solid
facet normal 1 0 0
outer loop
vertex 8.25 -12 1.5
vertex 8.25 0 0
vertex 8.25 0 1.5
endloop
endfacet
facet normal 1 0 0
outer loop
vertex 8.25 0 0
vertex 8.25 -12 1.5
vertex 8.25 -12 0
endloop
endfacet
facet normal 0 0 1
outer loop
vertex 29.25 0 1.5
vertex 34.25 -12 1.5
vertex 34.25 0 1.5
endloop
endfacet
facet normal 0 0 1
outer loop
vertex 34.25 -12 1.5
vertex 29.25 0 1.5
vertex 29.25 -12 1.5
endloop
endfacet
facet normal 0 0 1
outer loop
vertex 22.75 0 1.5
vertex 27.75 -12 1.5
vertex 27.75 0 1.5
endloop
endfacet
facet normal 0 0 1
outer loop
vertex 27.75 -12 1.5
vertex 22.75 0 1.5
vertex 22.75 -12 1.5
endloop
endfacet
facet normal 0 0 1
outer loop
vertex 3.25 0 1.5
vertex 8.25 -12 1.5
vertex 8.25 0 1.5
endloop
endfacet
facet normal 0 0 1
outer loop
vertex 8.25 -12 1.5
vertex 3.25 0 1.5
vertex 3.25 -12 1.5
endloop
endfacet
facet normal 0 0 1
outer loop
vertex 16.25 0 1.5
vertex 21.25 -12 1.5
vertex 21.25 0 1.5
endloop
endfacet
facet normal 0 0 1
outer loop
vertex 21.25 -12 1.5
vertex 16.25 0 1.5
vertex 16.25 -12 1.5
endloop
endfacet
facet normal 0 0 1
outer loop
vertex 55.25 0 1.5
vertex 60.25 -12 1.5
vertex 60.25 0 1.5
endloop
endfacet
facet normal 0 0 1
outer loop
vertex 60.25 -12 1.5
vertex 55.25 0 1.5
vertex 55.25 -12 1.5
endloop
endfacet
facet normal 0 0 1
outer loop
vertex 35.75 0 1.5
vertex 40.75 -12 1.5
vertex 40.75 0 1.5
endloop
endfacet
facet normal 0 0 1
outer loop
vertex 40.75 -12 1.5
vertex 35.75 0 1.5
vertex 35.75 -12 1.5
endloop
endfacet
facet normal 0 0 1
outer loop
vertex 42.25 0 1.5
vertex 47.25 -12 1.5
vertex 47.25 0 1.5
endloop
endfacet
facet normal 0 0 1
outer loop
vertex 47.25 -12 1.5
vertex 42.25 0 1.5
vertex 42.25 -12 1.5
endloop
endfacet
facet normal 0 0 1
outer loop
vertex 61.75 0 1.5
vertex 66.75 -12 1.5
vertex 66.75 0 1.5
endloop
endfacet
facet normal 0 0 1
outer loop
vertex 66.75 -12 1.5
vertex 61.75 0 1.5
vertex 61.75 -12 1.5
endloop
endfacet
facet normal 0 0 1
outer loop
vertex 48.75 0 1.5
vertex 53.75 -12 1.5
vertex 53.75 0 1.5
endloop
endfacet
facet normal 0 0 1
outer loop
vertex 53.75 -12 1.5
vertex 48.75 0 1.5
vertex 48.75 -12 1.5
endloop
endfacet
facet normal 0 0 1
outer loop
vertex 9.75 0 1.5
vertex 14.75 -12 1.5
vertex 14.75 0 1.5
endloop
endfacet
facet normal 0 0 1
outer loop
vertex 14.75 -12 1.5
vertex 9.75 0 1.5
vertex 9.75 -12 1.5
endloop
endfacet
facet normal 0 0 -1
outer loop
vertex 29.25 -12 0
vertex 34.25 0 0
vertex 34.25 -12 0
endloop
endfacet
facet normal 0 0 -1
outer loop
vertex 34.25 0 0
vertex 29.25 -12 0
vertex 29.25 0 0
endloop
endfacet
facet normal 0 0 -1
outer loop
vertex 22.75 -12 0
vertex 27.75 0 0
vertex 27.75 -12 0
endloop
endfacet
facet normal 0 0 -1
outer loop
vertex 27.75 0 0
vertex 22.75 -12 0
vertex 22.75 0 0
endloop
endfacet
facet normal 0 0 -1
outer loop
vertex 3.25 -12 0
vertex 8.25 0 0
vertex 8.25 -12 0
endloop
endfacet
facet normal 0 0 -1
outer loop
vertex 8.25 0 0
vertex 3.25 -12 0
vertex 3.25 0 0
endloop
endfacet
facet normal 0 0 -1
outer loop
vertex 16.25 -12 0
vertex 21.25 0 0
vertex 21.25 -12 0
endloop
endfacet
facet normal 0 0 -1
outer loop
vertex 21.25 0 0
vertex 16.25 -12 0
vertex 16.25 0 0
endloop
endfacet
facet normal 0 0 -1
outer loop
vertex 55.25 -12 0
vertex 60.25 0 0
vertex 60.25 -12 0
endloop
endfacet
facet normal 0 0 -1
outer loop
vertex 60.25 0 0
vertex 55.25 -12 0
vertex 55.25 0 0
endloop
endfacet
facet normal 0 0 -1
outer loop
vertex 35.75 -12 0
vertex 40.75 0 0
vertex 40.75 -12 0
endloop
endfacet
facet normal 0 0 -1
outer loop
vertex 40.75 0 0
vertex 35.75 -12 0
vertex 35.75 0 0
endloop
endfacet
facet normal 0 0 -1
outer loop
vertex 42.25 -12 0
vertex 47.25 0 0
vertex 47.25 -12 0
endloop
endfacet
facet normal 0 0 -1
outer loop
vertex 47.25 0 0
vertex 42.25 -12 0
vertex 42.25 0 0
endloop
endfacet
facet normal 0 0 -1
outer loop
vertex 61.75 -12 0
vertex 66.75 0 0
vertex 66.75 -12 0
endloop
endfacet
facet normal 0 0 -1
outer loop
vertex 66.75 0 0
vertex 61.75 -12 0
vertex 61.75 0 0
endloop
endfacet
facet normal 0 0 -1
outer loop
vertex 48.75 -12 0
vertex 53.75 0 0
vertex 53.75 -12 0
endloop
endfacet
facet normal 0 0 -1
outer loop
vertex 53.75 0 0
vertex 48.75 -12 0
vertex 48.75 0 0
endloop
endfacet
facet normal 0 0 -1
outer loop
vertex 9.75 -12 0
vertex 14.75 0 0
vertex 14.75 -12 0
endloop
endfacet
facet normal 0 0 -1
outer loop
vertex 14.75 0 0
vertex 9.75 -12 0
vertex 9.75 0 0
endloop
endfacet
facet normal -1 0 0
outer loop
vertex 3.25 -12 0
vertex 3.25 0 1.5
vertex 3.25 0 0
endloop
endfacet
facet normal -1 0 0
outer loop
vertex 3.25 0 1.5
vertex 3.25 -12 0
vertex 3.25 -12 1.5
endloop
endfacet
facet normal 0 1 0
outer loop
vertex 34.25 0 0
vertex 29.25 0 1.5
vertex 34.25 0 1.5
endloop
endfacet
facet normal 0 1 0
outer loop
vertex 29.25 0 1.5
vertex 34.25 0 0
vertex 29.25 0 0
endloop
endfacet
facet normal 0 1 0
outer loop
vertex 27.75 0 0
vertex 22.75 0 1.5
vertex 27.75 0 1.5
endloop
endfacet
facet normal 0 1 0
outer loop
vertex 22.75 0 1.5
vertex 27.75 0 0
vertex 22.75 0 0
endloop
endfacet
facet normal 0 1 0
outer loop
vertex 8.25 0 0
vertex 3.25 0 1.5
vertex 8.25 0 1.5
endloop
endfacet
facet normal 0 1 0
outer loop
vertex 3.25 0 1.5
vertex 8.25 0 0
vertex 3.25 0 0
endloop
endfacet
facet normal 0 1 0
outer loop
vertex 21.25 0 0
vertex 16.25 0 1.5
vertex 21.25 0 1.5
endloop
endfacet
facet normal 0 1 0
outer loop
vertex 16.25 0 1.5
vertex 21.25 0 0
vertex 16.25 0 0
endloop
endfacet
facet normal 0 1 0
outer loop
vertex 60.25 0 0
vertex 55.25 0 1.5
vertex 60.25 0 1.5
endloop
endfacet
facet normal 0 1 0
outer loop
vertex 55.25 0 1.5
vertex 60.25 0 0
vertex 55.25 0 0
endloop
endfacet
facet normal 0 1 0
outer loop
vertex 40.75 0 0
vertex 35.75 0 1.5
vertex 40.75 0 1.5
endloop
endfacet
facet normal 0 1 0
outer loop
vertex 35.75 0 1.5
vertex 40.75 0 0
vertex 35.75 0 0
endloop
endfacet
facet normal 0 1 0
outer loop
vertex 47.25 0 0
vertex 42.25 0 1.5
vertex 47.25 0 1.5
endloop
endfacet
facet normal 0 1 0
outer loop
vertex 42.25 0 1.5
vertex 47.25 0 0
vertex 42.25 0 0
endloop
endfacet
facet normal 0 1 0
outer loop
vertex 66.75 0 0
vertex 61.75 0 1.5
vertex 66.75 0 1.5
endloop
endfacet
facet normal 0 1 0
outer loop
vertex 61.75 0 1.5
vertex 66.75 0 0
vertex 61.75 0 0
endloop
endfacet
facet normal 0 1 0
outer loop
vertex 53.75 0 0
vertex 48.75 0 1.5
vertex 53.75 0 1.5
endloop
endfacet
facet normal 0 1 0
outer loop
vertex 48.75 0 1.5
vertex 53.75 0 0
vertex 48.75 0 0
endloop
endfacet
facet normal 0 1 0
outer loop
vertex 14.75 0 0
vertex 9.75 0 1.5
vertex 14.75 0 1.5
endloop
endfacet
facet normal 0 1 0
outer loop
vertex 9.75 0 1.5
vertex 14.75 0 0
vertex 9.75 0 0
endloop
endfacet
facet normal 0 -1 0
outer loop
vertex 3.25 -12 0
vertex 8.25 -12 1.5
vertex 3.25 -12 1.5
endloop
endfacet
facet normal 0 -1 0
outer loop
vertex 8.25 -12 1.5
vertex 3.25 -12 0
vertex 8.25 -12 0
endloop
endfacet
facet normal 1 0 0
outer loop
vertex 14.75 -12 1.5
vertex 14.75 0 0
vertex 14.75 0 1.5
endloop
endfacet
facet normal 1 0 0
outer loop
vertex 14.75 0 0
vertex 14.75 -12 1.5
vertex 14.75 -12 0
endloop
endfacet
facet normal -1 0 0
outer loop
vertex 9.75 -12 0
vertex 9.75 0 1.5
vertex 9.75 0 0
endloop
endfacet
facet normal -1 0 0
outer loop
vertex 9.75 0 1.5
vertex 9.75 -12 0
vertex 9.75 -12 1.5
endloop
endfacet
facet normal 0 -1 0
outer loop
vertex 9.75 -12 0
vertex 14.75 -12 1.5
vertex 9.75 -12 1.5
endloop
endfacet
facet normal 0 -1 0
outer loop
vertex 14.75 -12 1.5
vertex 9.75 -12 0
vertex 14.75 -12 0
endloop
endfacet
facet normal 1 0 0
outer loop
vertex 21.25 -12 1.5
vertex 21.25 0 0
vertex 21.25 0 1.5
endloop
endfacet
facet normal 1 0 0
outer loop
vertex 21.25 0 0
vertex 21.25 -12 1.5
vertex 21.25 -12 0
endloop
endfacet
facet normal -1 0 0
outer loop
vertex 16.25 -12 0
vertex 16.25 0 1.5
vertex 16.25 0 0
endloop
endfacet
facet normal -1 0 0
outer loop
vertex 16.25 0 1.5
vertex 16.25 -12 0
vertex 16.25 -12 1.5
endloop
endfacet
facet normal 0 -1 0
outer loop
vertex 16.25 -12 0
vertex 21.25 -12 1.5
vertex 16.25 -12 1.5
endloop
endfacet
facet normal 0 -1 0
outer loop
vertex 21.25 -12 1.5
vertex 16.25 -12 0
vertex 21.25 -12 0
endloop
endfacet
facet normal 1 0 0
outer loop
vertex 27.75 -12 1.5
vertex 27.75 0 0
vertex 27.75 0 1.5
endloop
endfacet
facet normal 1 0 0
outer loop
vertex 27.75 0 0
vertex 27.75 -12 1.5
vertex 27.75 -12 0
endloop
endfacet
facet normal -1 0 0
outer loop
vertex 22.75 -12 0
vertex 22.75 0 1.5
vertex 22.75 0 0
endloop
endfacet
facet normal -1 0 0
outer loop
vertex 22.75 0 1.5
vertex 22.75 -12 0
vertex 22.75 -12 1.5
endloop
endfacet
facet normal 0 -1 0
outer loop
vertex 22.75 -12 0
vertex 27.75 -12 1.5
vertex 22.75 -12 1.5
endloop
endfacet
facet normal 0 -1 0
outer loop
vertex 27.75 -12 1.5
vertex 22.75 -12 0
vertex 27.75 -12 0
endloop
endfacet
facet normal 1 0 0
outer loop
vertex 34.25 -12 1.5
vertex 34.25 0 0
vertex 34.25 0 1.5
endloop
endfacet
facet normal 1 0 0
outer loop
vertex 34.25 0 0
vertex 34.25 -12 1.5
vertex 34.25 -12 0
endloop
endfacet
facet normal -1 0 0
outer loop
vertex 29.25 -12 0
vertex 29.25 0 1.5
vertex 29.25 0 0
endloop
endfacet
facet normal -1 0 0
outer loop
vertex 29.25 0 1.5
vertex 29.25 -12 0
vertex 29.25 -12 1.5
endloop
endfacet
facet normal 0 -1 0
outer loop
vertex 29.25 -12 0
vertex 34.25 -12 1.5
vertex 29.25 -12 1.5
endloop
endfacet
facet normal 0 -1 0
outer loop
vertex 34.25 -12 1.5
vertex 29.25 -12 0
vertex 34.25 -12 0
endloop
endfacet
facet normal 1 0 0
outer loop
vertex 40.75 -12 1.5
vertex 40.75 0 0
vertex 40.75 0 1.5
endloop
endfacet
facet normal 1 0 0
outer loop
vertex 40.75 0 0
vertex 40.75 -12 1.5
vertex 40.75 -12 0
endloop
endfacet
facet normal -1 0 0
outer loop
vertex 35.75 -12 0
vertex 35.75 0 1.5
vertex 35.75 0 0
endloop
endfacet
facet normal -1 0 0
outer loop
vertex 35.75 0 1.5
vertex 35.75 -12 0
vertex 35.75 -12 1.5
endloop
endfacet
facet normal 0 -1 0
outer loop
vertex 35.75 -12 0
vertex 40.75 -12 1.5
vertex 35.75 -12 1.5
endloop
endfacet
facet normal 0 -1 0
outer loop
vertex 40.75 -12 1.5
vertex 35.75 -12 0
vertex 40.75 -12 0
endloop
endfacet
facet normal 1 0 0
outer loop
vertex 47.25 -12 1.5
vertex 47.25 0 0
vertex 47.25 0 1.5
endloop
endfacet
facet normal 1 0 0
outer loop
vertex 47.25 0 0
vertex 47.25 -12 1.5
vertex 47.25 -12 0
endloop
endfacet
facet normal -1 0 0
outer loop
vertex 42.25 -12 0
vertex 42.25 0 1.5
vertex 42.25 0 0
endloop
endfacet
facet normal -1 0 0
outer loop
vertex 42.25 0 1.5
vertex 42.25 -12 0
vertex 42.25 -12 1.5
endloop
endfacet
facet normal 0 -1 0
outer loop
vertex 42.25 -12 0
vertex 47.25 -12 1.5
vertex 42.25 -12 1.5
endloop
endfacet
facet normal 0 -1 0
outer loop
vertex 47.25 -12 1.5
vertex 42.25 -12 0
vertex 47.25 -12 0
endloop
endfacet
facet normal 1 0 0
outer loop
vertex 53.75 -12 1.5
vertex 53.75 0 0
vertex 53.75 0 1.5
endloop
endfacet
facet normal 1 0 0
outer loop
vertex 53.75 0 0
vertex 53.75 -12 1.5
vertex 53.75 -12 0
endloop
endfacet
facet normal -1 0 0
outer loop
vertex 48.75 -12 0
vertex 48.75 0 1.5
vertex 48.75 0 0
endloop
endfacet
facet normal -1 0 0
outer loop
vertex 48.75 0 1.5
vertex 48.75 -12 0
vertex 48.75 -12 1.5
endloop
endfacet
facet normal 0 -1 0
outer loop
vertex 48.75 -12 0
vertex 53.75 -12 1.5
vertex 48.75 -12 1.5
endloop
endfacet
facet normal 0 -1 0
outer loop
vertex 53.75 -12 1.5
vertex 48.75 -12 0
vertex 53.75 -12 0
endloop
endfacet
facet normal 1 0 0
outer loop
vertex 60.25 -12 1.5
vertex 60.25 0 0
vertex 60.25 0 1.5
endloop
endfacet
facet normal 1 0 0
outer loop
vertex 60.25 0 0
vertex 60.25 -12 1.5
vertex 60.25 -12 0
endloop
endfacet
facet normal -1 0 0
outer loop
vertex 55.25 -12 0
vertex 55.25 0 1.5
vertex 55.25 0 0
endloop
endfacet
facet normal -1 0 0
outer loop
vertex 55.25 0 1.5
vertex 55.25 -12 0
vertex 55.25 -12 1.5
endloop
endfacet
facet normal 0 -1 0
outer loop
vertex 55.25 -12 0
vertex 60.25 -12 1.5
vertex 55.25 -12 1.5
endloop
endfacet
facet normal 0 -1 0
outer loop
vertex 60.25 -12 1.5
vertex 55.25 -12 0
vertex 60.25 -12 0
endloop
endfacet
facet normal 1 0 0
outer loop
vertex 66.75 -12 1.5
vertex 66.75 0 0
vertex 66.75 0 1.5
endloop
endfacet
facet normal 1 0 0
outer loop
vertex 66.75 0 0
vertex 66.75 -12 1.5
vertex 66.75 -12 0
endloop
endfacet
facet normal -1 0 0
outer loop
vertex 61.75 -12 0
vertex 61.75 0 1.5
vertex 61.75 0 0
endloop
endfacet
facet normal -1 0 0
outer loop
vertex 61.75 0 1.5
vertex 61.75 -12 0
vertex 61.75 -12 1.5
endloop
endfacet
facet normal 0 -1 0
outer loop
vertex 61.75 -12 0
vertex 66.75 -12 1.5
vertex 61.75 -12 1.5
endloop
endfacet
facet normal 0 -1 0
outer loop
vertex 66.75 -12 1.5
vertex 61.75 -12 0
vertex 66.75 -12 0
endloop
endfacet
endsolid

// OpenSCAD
// 10-well comb for casting agarose gels
// Print orientation: lying flat on XY plane, z=0

// Overall plate thickness
plate_thickness = 1.5;

// Spine (back bar) dimensions
spine_length = 70;    // X direction
spine_width = 12;     // Y direction

// Tooth dimensions
tooth_width = 5.0;    // X direction
tooth_length = 12;    // Y direction (extends in -Y from spine)

// Gap between teeth
gap_width = 1.5;

// Number of teeth
num_teeth = 10;

// Calculate total width of teeth + gaps
total_tooth_width = num_teeth * tooth_width;
total_gap_width = (num_teeth - 1) * gap_width;
total_pattern_width = total_tooth_width + total_gap_width;

// Center offset to align pattern with spine center
pattern_offset_x = (spine_length - total_pattern_width) / 2;

// Spine center in Y (spine extends from y=0 to y=spine_width)
spine_y_start = 0;
spine_y_end = spine_width;

// Tooth extends from spine edge (y=0) in -Y direction
tooth_y_start = -tooth_length;
tooth_y_end = 0;

// Build the comb
difference() {
    // Main spine plate
    union() {
        // Spine
        translate([0, spine_y_start, 0])
            cube([spine_length, spine_width, plate_thickness]);
        
        // Teeth
        for (i = [0 : num_teeth - 1]) {
            x_pos = pattern_offset_x + i * (tooth_width + gap_width);
            translate([x_pos, tooth_y_start, 0])
                cube([tooth_width, tooth_length, plate_thickness]);
        }
    }
    
    // No cutting needed - this is a solid comb
    // Just ensure clean geometry
    translate([0, 0, -0.01])
        cube([spine_length + 0.02, spine_width + tooth_length + 0.02, plate_thickness + 0.02]);
}
